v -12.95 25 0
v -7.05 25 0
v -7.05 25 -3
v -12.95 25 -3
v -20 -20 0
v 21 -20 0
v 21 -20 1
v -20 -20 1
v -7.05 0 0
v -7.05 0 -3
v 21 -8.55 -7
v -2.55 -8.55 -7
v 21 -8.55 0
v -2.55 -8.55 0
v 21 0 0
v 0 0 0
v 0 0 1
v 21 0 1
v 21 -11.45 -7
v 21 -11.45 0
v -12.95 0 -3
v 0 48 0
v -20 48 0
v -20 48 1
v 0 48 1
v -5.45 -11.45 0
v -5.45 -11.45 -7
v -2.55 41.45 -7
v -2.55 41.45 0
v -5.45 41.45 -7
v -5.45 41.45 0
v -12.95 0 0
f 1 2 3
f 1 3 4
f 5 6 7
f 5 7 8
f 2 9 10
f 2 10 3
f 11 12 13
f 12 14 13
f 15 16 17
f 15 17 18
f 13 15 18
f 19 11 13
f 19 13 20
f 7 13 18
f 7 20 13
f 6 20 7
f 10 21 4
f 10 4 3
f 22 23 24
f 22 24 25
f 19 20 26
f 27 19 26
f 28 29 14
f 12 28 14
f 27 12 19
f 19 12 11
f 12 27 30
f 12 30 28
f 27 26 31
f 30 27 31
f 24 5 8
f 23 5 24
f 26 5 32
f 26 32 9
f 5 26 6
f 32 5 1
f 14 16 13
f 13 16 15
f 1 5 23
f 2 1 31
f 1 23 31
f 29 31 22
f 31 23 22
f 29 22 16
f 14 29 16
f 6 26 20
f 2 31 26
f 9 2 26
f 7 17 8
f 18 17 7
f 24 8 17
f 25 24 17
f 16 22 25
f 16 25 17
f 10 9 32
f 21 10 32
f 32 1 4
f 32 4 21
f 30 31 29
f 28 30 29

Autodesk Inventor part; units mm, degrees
ref_plane "YZ Plane" through (0, 0, 0) normal (1, 0, 0) x (0, 1, 0)
ref_plane "XZ Plane" through (0, 0, 0) normal (0, 1, 0) x (-1, 0, 0)
ref_plane "XY Plane" through (0, 0, 0) normal (0, 0, 1) x (1, 0, 0)
sketch "Sketch1" plane through (0, 0, 0) normal (0, 0, 1) x (1, 0, 0)
  line L0 (0, 0) -> (-20, 0)
  line L1 (-20, 0) -> (-20, 48)
  line L2 (-20, 48) -> (0, 48)
  line L3 (0, 48) -> (0, 0)
  line L4 (-20, 0) -> (21, 0)
  line L5 (21, 0) -> (21, -20)
  line L6 (21, -20) -> (-20, -20)
  line L7 (-20, -20) -> (-20, 0)
  line L8 (21, -11.45) -> (-2.55, -11.45)
  line L9 (-2.55, -11.45) -> (-2.55, -8.55)
  line L10 (-2.55, -8.55) -> (21, -8.55)
  line L11 (21, -8.55) -> (21, -11.45)
  line L12 (-2.55, -11.45) -> (-5.45, -11.45)
  line L13 (-5.45, -11.45) -> (-5.45, 41.45)
  line L14 (-5.45, 41.45) -> (-2.55, 41.45)
  line L15 (-2.55, 41.45) -> (-2.55, -11.45)
  line L16 (-2.55, 41.45) -> (-2.55, 38.55)
  line L17 (0, 38.55) -> (0, 41.45)
  line L18 (-12.95, 0) -> (-7.05, 0)
  line L19 (-7.05, 0) -> (-7.05, 25)
  line L20 (-7.05, 25) -> (-12.95, 25)
  line L21 (-12.95, 25) -> (-12.95, 0)
  point P0 (21, -10)
  point P1 (-2.5, 40)
  point P2 (-4, 13.49)
  point P3 (-10, 0)
  point P4 (-10, 48)
  dimension "d0" = 20
  dimension "d1" = 48
  dimension "d2" = 41
  dimension "d3" = 20
  dimension "d5" = 1.45
  dimension "d6" = 2.9
  dimension "d7" = 2.9
  dimension "d8" = 8
  dimension "d11" = 4
  dimension "d12" = 1.45
  dimension "d13" = 1.45
  dimension "d14" = 1.45
  dimension "d16" = 2.95
  dimension "d17" = 5.9
  dimension "d18" = 25
extrude "Extrusion1" add sketch "Sketch1" along normal blind 1
extrude "Extrusion2" add sketch "Sketch1" against normal blind 7 contours L13 L14 L15 L0 | L0 L15 L9 L12 L13 | L10 L5 L8 L9
extrude "Extrusion3" add sketch "Sketch1" against normal blind 3 contours L0 L21 L20 L19
equation "\"d5\" = 0.5 * d6"
equation "\"d7\" = d6"
equation "\"d12\" = 0.5 * d6"
equation "\"d14\" = 0.5 * d10"
equation "\"d10\" = d6"
properties part number "cache_nappe_cote"
